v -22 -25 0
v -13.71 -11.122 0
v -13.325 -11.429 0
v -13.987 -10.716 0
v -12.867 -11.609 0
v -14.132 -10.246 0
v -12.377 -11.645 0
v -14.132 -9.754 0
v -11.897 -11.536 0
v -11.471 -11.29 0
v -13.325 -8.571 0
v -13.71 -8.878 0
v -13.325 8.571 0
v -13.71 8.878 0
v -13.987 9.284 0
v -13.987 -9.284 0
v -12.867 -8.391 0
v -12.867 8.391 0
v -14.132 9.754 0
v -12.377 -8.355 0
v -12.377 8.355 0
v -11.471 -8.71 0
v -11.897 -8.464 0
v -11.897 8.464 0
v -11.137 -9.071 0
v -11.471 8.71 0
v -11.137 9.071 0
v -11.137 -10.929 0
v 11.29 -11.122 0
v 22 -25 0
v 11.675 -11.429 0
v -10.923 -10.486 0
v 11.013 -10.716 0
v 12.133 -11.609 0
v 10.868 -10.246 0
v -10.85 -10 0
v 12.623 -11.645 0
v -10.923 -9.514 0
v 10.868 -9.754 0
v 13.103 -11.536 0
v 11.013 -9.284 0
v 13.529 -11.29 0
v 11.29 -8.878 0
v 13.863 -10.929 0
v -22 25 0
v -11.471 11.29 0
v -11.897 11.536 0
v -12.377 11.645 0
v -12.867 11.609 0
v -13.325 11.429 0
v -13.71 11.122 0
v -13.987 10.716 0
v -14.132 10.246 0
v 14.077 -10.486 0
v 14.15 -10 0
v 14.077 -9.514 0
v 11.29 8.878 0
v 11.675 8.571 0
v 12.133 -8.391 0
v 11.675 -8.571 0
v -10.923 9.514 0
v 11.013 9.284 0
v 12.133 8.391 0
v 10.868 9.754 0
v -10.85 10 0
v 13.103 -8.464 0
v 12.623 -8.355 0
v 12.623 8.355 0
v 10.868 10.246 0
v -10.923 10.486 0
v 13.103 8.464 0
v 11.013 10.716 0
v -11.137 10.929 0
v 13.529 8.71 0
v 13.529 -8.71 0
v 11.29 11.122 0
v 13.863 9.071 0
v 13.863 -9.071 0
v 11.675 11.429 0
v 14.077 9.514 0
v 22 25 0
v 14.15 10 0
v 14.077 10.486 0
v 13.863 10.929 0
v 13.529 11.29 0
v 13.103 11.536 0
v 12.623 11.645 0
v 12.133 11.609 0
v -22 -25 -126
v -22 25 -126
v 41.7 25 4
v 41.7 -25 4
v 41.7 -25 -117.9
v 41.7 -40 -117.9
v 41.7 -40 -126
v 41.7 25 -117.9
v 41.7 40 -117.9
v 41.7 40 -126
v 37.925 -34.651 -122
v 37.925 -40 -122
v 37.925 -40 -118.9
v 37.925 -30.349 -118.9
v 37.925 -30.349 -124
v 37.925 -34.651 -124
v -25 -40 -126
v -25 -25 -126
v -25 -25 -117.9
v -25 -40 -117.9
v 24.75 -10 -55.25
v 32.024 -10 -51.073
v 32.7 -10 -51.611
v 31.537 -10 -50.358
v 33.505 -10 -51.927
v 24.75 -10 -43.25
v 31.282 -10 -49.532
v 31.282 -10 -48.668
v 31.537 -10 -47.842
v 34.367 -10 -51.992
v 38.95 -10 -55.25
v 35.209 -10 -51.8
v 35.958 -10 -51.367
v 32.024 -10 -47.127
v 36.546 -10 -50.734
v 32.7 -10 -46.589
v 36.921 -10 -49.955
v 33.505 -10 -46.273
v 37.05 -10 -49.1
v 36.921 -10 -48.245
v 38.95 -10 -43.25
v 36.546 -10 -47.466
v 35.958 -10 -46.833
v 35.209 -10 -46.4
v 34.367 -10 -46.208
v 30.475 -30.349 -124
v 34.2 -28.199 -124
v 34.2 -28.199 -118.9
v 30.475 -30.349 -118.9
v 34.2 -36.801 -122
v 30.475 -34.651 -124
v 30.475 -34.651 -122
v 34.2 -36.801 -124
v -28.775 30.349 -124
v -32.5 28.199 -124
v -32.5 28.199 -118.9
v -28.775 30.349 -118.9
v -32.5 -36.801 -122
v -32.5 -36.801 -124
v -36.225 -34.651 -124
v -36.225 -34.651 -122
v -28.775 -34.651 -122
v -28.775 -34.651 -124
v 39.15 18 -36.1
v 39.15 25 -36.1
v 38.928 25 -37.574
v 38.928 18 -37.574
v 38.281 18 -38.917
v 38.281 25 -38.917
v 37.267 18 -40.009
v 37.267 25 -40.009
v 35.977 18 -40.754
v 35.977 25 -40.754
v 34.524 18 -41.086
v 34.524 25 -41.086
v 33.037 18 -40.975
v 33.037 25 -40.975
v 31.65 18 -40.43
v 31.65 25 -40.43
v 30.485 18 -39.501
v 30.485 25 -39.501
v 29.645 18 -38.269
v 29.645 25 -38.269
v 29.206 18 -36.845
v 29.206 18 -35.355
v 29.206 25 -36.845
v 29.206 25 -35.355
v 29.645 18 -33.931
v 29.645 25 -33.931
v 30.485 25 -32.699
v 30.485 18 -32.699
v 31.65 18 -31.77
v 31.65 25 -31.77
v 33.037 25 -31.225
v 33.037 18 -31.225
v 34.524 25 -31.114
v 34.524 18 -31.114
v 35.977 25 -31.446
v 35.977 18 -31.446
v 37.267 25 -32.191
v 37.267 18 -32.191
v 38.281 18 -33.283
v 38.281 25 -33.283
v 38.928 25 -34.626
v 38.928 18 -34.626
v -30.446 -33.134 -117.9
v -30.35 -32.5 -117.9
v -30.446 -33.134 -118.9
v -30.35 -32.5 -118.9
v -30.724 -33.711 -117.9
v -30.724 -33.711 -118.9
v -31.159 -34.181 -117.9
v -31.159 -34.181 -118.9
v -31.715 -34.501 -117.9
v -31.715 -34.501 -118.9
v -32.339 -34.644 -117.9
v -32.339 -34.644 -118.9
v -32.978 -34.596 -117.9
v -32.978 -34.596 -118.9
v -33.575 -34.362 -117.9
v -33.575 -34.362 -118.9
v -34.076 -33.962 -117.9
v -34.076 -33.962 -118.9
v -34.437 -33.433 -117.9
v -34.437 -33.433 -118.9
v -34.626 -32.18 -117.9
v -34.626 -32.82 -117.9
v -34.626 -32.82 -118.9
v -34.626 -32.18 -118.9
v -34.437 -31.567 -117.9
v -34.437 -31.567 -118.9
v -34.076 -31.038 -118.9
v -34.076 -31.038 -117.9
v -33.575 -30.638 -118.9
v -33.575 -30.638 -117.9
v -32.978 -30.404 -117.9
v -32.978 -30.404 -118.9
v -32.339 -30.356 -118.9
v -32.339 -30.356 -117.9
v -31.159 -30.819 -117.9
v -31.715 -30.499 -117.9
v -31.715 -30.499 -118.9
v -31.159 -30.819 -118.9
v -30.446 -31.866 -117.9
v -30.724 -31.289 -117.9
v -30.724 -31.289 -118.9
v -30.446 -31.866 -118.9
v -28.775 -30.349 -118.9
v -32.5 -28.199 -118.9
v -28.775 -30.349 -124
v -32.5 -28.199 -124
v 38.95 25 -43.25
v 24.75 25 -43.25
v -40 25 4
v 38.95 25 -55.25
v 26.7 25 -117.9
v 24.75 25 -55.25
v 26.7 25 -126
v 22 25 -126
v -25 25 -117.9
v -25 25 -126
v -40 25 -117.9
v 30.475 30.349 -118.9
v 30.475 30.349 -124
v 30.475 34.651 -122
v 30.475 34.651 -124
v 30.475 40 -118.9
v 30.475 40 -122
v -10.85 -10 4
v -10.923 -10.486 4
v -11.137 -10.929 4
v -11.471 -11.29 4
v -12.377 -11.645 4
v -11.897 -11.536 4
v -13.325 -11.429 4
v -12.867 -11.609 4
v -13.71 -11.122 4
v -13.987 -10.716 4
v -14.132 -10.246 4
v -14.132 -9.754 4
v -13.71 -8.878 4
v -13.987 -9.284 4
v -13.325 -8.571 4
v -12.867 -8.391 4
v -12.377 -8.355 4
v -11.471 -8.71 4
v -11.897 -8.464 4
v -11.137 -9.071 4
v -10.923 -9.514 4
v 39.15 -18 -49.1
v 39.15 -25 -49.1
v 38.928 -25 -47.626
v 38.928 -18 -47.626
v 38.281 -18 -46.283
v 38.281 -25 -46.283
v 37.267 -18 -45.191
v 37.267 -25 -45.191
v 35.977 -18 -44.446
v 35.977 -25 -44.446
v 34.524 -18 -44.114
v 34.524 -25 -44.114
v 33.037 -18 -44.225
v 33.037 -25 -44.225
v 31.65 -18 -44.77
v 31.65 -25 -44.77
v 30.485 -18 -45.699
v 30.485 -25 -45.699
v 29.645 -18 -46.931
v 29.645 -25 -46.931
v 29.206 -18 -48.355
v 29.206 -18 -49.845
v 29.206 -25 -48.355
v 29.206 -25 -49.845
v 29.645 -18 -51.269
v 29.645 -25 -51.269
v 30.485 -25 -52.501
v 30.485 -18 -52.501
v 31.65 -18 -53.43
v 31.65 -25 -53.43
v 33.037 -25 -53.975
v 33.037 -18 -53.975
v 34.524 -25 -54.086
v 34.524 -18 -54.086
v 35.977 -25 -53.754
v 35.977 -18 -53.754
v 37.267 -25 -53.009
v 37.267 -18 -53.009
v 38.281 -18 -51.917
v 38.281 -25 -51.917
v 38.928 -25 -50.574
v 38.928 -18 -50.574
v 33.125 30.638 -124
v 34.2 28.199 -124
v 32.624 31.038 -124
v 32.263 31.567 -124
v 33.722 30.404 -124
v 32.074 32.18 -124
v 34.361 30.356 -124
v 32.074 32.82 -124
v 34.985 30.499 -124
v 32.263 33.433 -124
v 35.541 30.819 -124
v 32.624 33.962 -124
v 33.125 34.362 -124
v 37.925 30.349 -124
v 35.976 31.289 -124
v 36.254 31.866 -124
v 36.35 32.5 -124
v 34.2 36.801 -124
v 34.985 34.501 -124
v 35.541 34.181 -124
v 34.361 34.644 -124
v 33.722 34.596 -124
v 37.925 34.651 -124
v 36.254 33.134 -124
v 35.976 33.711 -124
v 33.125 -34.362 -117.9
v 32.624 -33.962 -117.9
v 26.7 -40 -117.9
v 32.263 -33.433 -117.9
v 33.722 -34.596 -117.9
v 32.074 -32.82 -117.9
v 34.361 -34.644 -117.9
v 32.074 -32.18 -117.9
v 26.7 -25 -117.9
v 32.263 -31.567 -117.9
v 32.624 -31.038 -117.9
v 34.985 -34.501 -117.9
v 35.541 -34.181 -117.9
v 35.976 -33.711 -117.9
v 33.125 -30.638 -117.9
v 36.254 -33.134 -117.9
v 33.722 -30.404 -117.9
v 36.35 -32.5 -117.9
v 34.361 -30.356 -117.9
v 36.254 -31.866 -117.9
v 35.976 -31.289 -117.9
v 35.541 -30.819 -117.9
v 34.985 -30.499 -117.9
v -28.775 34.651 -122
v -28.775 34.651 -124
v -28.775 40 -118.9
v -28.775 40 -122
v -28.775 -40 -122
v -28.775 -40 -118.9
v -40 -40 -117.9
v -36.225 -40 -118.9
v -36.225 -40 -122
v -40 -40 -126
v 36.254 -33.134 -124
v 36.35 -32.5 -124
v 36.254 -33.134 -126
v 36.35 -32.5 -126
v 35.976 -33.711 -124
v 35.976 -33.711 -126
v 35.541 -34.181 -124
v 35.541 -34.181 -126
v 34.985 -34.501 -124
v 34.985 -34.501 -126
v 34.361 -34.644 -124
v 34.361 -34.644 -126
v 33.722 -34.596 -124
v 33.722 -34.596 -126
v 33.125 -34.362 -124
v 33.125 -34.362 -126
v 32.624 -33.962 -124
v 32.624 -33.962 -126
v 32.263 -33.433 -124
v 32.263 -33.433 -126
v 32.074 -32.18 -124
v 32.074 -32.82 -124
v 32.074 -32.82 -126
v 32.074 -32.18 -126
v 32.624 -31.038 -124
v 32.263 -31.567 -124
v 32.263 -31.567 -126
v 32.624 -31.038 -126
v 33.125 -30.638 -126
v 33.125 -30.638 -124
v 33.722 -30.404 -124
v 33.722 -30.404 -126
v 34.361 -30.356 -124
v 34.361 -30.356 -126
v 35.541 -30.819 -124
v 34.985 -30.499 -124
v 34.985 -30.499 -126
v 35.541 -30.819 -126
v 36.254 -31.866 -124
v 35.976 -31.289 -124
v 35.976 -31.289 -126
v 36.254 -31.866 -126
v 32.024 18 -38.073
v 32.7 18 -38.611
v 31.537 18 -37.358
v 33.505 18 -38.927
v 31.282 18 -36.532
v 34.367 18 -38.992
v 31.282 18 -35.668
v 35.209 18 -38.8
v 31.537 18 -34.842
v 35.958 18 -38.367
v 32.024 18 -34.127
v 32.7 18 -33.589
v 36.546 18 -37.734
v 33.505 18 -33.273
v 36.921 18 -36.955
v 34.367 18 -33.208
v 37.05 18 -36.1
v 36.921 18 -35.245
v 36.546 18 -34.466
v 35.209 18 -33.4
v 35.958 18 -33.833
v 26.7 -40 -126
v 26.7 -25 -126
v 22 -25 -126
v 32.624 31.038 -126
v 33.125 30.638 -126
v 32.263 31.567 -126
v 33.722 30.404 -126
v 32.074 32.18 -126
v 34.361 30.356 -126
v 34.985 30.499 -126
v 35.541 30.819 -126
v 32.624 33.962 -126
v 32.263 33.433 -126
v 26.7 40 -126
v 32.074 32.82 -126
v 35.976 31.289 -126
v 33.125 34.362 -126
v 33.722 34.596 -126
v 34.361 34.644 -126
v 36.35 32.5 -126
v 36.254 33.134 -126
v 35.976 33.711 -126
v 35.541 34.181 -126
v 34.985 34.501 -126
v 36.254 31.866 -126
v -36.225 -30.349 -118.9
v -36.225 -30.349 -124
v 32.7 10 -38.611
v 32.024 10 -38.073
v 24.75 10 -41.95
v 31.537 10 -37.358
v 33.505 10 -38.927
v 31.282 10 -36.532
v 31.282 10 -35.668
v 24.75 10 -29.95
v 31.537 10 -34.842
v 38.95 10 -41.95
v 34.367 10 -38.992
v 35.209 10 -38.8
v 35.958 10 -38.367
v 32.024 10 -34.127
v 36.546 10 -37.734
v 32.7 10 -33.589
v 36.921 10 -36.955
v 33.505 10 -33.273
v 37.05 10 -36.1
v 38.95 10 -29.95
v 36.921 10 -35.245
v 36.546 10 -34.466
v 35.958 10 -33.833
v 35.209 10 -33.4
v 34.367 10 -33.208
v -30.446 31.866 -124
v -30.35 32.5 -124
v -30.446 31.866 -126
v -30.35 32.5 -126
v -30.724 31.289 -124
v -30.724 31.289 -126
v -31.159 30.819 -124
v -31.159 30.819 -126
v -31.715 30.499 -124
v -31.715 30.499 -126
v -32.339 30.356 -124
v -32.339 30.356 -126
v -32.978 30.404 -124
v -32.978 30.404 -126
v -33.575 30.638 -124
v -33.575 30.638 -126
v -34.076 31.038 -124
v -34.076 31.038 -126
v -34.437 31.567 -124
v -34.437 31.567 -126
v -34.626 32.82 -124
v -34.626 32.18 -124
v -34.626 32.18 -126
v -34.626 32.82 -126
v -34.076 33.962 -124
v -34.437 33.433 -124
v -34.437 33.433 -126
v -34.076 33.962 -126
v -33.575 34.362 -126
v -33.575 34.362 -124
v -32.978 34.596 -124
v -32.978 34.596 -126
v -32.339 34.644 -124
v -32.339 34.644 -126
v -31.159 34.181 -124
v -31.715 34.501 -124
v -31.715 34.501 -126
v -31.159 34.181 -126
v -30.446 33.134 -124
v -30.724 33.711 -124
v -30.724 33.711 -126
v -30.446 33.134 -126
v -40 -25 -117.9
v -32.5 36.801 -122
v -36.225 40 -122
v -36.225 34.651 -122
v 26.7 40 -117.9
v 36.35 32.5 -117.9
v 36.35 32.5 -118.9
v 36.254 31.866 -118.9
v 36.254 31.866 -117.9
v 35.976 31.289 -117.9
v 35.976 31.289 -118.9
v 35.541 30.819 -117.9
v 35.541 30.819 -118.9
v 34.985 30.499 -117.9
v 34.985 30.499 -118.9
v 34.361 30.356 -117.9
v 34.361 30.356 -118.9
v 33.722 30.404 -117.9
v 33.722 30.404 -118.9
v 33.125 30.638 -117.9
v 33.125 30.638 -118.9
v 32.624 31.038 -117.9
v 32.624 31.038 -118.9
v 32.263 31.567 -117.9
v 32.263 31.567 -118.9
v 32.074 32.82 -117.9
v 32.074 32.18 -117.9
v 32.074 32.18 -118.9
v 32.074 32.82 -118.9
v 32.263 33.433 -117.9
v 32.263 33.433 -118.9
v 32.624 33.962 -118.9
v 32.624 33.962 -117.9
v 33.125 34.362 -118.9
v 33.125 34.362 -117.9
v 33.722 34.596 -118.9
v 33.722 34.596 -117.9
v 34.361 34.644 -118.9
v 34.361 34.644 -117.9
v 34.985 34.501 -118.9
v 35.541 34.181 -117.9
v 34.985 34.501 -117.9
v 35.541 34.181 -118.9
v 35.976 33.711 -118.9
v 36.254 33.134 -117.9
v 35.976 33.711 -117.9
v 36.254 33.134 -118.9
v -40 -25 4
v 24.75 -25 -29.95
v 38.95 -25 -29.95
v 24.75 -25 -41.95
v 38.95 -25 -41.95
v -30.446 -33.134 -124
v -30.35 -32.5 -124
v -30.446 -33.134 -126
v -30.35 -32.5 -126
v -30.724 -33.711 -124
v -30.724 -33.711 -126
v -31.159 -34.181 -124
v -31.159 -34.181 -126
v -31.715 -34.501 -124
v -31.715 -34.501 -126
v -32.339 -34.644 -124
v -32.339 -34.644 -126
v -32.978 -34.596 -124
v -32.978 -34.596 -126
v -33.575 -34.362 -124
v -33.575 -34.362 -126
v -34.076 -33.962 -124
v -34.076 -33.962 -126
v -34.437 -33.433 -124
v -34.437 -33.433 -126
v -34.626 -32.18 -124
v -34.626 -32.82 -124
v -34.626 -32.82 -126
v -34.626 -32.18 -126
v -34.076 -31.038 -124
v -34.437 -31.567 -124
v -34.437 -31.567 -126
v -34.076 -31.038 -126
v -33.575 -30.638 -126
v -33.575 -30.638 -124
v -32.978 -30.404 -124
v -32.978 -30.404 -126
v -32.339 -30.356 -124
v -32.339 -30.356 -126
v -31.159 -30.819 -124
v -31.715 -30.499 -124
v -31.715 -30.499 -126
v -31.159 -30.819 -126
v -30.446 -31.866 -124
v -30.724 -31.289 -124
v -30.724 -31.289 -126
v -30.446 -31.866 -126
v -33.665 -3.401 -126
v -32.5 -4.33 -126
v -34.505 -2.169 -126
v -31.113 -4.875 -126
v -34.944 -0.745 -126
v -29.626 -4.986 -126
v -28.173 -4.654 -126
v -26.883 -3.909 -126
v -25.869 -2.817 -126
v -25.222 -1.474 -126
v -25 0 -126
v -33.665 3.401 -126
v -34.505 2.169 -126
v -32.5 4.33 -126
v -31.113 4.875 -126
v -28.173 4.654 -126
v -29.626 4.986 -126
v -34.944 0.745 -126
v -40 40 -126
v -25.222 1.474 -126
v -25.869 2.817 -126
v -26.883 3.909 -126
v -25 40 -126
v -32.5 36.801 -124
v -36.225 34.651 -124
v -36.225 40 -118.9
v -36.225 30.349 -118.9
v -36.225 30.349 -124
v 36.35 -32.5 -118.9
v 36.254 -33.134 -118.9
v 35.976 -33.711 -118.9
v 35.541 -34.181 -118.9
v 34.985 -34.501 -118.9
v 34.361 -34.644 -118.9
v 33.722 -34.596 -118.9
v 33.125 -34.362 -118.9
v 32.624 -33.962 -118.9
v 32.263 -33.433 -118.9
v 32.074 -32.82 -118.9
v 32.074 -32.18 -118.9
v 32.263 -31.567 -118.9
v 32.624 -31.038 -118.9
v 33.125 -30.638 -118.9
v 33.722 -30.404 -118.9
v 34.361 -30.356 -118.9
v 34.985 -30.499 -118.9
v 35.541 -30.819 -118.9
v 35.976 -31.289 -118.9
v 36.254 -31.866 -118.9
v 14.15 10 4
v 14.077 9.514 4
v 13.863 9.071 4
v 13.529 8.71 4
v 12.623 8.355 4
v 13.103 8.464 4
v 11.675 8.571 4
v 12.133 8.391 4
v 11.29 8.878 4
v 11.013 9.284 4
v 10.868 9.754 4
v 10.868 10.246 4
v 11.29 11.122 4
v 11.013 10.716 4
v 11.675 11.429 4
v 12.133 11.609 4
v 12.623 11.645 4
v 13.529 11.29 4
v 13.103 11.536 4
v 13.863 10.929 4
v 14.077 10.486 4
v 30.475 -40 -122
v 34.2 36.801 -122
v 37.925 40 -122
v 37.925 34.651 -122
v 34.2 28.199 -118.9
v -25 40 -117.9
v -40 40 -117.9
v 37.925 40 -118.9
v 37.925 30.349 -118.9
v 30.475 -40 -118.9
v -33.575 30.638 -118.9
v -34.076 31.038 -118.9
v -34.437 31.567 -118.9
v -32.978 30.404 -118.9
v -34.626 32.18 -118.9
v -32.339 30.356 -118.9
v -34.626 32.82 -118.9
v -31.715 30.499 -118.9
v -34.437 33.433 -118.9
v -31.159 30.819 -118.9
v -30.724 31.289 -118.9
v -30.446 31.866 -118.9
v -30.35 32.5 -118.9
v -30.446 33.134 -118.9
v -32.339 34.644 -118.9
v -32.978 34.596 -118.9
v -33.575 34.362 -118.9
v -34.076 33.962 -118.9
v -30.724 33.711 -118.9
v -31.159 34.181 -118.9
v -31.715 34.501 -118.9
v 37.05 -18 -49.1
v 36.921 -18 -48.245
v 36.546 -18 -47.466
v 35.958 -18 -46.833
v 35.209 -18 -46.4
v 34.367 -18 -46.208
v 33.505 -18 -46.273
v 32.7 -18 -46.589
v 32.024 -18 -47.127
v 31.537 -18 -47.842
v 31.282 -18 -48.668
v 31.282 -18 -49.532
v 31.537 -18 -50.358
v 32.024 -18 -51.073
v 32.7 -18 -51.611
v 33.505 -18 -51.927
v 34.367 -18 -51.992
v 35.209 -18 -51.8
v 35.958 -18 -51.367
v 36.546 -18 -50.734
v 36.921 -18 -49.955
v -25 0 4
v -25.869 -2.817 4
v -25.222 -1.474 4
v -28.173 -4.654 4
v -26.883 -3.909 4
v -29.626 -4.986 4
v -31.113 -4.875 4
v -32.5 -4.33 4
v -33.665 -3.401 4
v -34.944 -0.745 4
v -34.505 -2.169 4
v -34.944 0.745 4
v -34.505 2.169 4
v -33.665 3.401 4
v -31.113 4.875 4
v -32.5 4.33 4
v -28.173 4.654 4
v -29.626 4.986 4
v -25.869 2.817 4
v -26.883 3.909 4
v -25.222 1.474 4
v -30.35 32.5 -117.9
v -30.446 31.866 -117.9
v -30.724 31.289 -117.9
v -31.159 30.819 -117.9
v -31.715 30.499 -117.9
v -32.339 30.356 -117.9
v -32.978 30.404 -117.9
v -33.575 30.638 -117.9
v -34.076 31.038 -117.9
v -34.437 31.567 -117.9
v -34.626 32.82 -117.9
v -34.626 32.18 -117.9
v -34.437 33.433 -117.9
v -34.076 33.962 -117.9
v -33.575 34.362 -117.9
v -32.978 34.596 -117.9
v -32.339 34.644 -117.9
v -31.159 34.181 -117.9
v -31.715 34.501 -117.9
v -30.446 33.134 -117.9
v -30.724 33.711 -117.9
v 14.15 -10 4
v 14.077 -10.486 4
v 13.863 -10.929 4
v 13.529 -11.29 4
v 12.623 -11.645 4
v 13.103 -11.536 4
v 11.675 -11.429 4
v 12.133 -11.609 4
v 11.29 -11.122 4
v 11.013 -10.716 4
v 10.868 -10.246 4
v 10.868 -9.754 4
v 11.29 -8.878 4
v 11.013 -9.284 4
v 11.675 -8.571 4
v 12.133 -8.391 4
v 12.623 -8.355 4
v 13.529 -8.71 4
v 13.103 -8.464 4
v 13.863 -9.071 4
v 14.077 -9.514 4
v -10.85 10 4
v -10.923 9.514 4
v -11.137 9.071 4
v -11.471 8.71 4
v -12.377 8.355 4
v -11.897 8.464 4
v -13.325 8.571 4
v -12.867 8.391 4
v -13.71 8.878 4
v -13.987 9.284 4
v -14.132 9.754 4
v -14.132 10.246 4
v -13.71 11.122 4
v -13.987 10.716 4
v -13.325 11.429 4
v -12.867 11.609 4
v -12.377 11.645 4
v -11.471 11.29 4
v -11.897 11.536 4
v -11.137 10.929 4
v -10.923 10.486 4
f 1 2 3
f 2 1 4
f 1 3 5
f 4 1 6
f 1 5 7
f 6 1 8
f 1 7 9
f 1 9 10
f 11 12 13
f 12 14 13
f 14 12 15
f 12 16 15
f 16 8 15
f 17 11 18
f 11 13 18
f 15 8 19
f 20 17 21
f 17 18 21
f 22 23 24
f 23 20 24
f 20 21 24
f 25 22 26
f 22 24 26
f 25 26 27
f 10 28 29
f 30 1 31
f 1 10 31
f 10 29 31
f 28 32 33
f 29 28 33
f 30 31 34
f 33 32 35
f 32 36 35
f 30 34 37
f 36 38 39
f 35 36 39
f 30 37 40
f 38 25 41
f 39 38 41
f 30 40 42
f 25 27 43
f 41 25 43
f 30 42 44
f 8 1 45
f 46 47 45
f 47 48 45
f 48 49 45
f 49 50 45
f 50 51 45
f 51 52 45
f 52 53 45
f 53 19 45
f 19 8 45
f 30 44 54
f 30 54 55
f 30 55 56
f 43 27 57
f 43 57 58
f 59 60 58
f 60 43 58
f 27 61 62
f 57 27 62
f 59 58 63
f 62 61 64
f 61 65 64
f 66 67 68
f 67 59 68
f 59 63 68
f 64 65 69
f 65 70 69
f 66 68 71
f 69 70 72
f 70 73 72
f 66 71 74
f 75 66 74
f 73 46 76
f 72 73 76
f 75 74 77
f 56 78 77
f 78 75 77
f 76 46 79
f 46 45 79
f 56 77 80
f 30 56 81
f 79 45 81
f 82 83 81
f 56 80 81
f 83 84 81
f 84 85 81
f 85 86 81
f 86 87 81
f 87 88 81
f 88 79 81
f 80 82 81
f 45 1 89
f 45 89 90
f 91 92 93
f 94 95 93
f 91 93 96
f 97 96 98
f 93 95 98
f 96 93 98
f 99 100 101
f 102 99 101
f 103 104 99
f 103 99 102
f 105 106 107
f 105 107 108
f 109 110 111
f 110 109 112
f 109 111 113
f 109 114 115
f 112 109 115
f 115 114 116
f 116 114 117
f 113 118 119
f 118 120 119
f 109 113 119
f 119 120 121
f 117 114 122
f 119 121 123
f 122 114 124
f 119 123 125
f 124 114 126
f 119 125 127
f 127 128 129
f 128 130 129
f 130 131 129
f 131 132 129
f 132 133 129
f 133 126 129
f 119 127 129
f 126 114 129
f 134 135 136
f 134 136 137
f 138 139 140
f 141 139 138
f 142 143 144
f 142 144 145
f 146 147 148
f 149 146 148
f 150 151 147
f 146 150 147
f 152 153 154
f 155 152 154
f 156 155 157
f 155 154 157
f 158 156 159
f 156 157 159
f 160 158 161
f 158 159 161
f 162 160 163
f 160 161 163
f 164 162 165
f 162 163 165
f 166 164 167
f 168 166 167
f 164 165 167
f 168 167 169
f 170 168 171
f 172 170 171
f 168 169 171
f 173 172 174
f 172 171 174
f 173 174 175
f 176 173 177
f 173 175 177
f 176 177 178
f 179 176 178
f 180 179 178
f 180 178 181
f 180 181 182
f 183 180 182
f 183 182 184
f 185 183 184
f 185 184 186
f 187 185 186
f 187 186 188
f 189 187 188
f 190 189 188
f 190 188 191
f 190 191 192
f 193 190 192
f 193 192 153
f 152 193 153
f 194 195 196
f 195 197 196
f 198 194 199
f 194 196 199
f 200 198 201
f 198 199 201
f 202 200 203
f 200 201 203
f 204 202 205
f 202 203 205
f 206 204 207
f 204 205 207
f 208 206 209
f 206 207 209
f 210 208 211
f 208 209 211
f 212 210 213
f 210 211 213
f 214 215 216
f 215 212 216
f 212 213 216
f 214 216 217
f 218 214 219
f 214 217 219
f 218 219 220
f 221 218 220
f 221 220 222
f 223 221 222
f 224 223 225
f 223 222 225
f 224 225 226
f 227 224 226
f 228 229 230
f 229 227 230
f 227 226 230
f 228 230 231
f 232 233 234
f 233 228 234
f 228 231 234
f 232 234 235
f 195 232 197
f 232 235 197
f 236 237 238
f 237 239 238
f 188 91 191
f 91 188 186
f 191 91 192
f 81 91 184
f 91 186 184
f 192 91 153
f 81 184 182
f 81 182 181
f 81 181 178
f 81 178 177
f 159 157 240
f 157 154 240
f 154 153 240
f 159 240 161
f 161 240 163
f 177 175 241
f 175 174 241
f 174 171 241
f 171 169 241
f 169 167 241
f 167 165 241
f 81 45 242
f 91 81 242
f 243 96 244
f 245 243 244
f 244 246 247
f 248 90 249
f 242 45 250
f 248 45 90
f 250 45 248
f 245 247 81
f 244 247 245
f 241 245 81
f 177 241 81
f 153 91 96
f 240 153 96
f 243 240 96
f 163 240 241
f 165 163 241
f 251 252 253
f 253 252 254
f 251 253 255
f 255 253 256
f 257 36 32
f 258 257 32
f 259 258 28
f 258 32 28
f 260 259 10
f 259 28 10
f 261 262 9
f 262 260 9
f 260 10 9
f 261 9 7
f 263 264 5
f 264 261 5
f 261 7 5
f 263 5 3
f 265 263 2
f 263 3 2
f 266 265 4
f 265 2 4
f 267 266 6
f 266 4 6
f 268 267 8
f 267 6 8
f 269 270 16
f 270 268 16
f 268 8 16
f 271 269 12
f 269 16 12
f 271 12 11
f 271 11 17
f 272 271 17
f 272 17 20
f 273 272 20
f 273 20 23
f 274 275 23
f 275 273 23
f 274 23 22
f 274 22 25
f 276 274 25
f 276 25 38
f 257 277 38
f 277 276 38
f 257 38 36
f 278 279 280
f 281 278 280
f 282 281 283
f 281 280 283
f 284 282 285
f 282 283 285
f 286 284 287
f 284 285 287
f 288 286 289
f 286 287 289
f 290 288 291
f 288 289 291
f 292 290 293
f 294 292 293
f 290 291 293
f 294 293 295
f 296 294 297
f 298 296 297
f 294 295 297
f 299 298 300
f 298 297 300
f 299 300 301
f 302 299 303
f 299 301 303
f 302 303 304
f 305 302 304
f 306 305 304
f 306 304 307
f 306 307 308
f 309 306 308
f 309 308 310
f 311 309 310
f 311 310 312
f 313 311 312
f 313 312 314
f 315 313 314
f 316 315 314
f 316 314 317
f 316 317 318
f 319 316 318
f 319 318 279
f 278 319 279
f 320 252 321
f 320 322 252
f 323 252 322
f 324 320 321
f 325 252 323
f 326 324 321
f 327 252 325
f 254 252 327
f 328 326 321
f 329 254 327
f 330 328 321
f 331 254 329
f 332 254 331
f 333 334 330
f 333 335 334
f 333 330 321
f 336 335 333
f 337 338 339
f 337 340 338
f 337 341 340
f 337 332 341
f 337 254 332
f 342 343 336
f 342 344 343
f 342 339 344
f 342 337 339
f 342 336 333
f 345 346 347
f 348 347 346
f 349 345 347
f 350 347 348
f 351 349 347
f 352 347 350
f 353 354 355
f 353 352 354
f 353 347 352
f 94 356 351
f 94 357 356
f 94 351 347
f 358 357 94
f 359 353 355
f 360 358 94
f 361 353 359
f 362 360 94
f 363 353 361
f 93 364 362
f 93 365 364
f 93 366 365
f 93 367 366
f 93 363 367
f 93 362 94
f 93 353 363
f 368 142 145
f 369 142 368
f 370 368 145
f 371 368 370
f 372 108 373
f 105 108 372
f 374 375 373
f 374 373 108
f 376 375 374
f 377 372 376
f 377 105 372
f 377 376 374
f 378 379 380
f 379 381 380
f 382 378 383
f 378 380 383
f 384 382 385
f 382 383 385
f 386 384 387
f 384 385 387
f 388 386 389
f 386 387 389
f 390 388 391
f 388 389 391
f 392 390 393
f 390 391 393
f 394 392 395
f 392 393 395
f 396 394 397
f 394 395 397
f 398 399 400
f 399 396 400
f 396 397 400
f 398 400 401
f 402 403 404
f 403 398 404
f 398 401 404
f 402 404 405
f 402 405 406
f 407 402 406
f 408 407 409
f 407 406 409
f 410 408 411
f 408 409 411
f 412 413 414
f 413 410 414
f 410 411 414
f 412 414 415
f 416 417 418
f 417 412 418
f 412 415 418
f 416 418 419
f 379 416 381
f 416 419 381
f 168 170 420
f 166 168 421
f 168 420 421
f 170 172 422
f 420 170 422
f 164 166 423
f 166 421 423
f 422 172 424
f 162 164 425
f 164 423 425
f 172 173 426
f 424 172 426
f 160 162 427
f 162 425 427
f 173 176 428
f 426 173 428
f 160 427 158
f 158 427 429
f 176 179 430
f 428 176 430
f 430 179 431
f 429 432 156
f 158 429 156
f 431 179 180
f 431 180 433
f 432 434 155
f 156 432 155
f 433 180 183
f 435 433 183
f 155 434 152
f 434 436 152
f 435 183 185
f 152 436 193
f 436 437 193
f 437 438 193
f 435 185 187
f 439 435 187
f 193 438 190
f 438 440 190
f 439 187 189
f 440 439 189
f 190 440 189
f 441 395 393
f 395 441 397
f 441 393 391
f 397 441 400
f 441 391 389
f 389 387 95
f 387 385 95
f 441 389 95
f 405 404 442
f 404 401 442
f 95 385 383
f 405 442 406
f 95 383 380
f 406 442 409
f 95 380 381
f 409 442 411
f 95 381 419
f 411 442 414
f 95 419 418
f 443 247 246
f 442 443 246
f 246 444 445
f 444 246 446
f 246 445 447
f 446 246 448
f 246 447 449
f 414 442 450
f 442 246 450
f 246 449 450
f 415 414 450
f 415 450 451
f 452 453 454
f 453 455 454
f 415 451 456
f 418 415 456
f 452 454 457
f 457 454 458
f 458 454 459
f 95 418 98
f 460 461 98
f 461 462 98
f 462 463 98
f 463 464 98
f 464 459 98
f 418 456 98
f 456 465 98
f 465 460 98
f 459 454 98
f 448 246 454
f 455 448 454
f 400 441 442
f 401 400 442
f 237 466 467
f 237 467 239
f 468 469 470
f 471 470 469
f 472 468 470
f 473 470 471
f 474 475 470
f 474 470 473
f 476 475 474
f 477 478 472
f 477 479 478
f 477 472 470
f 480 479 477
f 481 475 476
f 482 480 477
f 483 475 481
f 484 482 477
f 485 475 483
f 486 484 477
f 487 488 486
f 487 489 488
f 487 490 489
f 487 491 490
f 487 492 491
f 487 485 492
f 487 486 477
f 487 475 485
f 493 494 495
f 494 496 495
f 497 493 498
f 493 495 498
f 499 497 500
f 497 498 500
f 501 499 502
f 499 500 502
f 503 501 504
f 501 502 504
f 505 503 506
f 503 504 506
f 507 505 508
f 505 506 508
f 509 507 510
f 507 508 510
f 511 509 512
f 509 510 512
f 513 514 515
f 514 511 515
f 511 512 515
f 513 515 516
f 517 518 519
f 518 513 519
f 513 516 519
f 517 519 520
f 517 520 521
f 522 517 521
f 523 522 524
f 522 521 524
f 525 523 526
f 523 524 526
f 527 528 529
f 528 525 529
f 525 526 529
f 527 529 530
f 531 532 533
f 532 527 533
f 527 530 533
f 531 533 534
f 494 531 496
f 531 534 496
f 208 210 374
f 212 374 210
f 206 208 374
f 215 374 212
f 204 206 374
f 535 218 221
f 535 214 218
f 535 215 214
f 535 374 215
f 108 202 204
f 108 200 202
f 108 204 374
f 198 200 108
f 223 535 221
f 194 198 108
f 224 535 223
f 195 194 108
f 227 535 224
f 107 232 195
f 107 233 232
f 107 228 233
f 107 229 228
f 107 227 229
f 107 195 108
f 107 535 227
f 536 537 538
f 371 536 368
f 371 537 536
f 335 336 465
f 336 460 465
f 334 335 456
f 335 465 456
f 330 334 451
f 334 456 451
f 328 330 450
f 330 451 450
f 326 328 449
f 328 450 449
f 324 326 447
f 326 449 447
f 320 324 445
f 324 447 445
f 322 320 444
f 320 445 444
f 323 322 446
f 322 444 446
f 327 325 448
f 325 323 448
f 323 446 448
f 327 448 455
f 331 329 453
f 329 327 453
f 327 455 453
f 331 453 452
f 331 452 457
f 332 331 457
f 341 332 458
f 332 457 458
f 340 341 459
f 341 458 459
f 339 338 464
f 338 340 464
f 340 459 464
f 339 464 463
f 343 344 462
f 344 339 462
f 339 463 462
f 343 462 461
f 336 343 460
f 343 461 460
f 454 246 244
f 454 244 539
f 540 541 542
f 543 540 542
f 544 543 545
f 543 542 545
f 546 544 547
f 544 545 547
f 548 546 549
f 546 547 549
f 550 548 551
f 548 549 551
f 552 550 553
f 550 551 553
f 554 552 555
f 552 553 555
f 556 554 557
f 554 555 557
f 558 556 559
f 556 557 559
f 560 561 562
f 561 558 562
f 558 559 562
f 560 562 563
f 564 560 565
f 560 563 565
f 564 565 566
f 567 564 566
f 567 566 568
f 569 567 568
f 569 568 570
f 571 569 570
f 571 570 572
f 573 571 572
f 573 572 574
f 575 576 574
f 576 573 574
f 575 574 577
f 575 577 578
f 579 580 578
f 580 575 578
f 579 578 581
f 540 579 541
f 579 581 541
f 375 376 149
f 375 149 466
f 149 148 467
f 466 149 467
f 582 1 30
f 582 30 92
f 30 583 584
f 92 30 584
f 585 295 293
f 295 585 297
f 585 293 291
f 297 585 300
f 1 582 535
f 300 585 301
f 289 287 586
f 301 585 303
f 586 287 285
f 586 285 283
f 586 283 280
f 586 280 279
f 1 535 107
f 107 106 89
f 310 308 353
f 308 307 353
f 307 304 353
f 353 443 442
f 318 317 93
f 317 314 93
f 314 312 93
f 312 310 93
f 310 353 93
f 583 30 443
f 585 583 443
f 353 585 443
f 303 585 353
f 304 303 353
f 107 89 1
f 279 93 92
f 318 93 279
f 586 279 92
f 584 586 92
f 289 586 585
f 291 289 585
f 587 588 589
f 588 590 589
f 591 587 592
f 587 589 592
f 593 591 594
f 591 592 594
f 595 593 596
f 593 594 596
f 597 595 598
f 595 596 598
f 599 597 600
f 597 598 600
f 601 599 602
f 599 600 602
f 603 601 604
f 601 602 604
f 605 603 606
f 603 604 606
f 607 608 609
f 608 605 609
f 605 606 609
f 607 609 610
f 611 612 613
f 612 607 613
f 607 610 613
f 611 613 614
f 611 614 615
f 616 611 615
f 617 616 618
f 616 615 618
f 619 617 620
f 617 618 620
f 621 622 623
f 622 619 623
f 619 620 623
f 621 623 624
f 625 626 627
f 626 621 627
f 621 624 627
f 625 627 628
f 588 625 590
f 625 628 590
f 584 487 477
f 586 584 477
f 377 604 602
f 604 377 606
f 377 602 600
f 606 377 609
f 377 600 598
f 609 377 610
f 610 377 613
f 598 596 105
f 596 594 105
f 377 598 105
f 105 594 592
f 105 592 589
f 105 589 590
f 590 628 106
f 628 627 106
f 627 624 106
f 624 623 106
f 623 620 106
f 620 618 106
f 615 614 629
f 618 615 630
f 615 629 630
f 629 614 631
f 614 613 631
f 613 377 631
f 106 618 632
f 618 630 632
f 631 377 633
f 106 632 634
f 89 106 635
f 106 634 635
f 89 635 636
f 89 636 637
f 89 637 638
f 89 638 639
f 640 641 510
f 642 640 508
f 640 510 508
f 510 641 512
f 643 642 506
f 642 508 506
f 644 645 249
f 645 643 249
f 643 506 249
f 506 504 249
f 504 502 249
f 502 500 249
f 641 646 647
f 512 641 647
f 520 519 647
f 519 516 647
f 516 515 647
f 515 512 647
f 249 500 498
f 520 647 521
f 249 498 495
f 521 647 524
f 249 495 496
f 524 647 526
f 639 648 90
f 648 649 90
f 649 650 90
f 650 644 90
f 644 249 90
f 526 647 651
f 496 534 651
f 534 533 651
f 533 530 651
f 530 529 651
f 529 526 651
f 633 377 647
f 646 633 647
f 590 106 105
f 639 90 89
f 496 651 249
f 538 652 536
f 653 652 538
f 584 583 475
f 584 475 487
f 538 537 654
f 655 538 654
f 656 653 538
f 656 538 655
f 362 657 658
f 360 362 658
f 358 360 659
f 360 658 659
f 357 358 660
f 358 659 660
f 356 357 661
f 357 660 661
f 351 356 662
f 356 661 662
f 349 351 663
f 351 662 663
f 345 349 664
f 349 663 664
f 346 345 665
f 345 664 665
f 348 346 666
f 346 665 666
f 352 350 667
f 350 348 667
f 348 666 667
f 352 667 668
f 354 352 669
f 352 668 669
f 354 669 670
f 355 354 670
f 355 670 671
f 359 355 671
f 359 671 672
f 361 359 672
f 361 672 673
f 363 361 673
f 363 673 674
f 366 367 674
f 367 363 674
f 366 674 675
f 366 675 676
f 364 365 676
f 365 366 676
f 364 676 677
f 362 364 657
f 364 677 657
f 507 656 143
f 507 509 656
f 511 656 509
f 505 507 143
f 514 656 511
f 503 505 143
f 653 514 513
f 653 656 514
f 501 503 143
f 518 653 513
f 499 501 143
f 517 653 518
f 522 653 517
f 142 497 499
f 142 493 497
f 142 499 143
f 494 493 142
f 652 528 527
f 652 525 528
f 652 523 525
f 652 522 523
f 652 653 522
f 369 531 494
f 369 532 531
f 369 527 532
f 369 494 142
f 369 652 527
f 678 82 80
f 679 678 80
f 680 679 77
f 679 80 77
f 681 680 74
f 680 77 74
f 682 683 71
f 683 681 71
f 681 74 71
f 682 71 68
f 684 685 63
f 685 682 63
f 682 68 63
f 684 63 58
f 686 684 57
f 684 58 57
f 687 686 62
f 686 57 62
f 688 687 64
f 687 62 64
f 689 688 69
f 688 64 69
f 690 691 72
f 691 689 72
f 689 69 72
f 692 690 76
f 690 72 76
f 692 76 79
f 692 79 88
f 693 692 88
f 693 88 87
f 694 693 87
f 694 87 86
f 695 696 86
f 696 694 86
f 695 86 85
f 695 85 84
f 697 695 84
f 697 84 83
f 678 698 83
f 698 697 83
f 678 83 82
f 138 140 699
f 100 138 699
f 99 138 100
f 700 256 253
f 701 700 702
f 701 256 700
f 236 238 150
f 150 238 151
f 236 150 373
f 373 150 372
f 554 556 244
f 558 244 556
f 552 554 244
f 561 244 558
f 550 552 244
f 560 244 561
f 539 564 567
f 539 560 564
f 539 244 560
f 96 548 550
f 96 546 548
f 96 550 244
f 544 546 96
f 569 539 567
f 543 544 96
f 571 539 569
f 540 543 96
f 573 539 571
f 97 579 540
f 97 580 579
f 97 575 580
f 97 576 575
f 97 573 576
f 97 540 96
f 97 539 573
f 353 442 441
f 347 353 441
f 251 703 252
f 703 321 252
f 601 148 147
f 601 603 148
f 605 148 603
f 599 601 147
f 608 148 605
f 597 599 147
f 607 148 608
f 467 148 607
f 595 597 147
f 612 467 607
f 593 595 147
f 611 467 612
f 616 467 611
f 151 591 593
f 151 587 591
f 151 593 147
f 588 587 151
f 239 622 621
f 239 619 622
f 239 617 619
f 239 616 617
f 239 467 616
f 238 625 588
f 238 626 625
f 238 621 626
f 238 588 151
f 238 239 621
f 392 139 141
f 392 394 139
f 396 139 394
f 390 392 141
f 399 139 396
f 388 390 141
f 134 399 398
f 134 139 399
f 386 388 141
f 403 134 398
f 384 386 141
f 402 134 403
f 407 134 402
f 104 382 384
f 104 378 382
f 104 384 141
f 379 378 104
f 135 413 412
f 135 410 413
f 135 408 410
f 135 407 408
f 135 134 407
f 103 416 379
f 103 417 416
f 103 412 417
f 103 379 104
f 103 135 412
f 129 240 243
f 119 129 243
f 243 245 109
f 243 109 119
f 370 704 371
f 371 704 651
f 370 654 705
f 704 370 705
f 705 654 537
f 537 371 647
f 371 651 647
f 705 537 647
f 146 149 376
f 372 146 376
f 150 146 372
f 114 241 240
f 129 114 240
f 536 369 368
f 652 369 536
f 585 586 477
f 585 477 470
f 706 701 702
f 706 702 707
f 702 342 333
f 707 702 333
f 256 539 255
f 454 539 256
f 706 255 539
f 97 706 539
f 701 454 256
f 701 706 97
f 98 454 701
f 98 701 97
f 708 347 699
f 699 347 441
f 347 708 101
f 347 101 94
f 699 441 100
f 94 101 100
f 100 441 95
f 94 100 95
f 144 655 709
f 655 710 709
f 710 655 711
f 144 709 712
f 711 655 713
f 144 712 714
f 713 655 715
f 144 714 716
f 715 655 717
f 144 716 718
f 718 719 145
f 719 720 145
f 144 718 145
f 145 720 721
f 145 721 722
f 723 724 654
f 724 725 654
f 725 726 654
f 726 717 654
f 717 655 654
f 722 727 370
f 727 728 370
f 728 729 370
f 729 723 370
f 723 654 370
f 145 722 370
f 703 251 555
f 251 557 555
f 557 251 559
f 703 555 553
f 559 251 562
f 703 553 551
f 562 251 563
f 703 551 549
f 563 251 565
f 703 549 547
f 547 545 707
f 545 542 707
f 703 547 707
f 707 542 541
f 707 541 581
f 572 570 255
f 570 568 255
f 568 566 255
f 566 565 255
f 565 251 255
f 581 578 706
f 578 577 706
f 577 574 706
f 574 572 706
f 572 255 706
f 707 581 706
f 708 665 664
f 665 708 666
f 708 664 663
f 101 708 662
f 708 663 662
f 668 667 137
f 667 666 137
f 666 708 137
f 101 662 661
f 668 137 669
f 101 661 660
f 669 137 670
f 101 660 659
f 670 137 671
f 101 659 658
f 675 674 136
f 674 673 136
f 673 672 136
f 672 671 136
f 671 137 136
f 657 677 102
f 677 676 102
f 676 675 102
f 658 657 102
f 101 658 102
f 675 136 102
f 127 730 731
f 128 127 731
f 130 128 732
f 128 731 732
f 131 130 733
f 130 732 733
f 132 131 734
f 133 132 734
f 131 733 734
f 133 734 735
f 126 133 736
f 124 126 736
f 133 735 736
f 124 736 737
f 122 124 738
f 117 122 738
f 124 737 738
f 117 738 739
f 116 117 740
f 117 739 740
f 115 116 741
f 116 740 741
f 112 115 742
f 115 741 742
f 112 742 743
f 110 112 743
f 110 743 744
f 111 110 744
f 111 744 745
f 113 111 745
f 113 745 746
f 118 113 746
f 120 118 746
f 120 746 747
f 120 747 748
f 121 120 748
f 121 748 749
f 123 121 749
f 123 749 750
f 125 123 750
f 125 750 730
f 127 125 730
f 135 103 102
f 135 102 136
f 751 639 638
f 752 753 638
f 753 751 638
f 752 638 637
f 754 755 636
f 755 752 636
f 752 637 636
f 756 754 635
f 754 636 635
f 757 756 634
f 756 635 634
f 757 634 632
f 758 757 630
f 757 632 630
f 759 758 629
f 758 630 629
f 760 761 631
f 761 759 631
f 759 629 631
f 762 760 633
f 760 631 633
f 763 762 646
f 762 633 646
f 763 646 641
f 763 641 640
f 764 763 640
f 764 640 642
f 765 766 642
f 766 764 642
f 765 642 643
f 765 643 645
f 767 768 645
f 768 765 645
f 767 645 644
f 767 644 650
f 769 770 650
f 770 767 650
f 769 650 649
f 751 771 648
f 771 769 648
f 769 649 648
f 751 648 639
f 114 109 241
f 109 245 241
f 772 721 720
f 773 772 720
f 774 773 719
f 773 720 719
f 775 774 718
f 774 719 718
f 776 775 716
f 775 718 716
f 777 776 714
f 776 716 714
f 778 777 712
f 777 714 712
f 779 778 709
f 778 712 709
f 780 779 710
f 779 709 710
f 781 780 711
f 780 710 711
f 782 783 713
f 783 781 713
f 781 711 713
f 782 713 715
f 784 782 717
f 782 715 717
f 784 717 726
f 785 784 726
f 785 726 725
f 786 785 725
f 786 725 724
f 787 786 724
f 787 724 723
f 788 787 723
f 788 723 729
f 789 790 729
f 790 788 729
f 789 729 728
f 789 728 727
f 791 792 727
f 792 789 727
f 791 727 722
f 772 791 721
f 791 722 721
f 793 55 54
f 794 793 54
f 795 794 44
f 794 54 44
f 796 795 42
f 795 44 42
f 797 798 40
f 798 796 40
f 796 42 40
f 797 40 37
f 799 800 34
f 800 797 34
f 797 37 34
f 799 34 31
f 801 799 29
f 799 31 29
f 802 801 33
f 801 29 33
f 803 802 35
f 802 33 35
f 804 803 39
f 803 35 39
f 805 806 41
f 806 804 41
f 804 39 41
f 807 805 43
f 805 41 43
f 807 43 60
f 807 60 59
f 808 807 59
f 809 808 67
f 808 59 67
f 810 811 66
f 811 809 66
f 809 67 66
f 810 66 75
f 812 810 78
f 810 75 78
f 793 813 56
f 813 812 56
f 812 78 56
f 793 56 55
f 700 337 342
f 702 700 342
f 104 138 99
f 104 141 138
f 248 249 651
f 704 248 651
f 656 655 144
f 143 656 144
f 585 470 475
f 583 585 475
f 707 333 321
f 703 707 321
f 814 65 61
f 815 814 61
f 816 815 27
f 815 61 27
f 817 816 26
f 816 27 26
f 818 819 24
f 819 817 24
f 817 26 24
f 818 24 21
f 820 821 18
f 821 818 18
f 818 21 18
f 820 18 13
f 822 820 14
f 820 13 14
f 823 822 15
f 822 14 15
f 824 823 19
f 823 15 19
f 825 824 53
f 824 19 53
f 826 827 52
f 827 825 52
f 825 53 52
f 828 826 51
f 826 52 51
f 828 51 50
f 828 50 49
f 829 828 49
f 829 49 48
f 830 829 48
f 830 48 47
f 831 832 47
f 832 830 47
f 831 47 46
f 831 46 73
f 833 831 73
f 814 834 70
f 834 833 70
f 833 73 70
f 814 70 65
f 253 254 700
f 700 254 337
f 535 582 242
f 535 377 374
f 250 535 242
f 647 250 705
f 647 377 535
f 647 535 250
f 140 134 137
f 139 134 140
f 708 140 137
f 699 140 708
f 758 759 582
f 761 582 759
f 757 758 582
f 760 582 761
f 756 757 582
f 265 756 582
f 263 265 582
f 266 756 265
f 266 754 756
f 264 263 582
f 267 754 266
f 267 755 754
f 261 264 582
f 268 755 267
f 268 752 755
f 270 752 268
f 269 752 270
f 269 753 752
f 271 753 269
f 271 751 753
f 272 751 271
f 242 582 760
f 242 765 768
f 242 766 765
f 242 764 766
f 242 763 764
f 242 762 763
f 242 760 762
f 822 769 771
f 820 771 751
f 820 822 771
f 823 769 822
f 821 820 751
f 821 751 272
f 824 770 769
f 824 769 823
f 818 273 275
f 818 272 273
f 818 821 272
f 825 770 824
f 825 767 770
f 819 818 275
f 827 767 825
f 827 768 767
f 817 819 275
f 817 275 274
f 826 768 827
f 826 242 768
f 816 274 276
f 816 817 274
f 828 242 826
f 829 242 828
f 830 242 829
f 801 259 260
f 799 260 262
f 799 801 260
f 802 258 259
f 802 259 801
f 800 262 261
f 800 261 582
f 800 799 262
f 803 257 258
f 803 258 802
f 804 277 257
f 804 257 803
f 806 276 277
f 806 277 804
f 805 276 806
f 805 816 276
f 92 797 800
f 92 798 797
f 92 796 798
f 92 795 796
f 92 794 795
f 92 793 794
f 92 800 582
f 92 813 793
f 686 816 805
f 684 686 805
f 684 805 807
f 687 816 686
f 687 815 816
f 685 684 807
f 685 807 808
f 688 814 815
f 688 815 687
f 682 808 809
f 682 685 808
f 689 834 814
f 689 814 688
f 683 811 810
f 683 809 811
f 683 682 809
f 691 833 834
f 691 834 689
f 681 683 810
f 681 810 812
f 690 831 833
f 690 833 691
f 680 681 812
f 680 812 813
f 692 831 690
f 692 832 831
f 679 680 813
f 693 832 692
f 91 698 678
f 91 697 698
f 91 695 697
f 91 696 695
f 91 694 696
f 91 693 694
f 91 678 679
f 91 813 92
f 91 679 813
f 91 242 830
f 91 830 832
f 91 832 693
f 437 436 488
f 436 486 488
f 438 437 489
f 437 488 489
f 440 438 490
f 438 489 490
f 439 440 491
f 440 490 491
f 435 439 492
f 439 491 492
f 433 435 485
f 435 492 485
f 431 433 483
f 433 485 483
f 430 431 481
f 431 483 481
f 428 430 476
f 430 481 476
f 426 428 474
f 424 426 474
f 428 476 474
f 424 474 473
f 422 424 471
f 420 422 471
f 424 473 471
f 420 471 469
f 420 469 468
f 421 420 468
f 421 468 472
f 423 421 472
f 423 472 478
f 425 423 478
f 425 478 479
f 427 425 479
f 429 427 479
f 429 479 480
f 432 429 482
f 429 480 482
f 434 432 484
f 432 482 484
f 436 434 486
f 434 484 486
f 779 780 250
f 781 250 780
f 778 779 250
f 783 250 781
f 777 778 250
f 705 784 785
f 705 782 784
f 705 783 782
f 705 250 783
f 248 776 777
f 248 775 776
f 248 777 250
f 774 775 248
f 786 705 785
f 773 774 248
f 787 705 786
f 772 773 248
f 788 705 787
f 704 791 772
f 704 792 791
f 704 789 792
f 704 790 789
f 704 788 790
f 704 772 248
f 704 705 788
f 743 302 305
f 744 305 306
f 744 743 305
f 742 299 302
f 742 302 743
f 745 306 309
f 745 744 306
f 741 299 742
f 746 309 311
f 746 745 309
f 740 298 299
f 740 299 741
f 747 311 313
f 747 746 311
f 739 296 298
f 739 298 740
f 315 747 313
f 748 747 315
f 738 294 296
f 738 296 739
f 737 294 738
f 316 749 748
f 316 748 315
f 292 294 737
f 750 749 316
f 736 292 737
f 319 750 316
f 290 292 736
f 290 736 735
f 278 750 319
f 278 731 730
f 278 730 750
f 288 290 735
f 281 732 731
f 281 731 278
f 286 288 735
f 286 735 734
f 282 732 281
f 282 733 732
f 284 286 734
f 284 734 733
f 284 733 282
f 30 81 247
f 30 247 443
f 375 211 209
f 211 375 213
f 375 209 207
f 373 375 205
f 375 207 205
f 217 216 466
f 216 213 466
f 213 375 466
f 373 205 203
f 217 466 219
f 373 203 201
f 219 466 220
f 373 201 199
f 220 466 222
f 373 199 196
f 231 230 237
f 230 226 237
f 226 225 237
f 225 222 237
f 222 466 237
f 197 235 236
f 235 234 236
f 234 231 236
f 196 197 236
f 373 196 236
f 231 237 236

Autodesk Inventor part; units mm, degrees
sketch "S-ProbeHead-BaseSkizze" plane through (0, 0, 0) normal (0, 0, 1) x (1, 0, 0)
  line L0 (-40, 40) -> (40, 40)
  line L1 (40, 40) -> (40, -40)
  line L2 (40, -40) -> (-40, -40)
  line L3 (-40, -40) -> (-40, 40)
  line L4 (-40, 40) -> (40, -40) construction
  line L5 (40, 40) -> (-40, -40) construction
  line L6 (-56.34, 0) -> (58.04, 0) construction
  circle A0 centre (-30, 0) radius 5
  line L7 (0, 83.0683) -> (0, -88.0384) construction
  line L8 (-7.5, 58.6245) -> (-7.5, -60.8735) construction
  line L9 (-16, 21) -> (16, 21) construction
  line L10 (16, 21) -> (16, -21) construction
  line L11 (16, -21) -> (-16, -21) construction
  line L12 (-16, -21) -> (-16, 21) construction
  line L13 (-16, 21) -> (16, -21) construction
  line L14 (16, 21) -> (-16, -21) construction
  circle A1 centre (-12.5, -10) radius 1.65
  circle A2 centre (-12.5, 10) radius 1.65
  circle A3 centre (12.5, -10) radius 1.65
  circle A4 centre (12.5, 10) radius 1.65
  line L15 (-20, 57.6709) -> (-20, -63.5946)
  line L16 (7.5, 58.6245) -> (7.5, -60.8735) construction
  line L17 (20, 57.6709) -> (20, -63.5946)
  line L18 (41.7, 25) -> (-40, 25)
  line L19 (-40, 25) -> (-40, -25)
  line L20 (-40, -25) -> (41.7, -25)
  line L21 (41.7, -25) -> (41.7, 25)
  line L22 (22, 25) -> (22, -25)
  line L23 (-22, -25) -> (-22, 25)
  point P0 (0, 0)
  point P1 (41.7, 0)
  dimension "d1" = 80
  dimension "d2" = 80
  dimension "d4" = 10
  dimension "d6" = 30
  dimension "d20" = 7.5
  dimension "d21" = 32
  dimension "d22" = 42
  dimension "d23" = 3.3
  dimension "d24" = 10
  dimension "d25" = 12.5
  dimension "d26" = 20
  dimension "d27" = 50
  dimension "d30" = 20
  dimension "d31" = 21.7
  dimension "d32" = 2
  dimension "d37" = 2
extrude "BasePlate" add sketch "S-ProbeHead-BaseSkizze" along normal blind 4 contours L18 L23 L20 L3 | L18 L17 L20 L15 | L15 L20 L23 L18 | L18 L22 L20 L17 | L18 L21 L20 L1 | L1 L20 L22 L18
ref_plane "Endfläche-ProbeHeadarme" through (0, 0, -126) normal (0, 0, 1) x (1, 0, 0)
ref_plane "ProfilDownside" through (0, 0, -56) normal (0, 0, 1) x (1, 0, 0)
extrude "Arms" add sketch "S-ProbeHead-BaseSkizze" against normal up to surface (126 mm away) contours L18 L23 L20 L3 | L18 L21 L20 L1 | L1 L20 L22 L18
ref_plane "Z-UpperBelt" through (0, 0, -36.1) normal (0, 0, 1) x (1, 0, 0)
ref_plane "Z-LowerBelt" through (0, 0, -49.1) normal (0, 0, 1) x (1, 0, 0)
ref_plane "X-Belts" through (26.75, 0, 0) normal (1, 0, 0) x (0, 1, 0)
sketch "S-Tensioners" plane through (-40, -25, 4) normal (0, -1, 0) x (1, 0, 0)
  line L0 (64.75, -47.25) -> (78.95, -47.25)
  line L1 (78.95, -47.25) -> (78.95, -58.95)
  line L2 (78.95, -58.95) -> (64.75, -58.95)
  line L3 (64.75, -58.95) -> (64.75, -47.25)
  line L4 (64.75, -47.25) -> (78.95, -58.95) construction
  line L5 (78.95, -47.25) -> (64.75, -58.95) construction
  line L6 (71.85, -74) -> (71.85, 12.5724) construction
  line L7 (-16.34, -40.1) -> (98.04, -40.1) construction
  line L8 (-16.34, -53.1) -> (98.04, -53.1) construction
  circle A0 centre (74.15, -53.1) radius 2.9
  line L9 (64.75, -34.25) -> (78.95, -34.25)
  line L10 (78.95, -34.25) -> (78.95, -45.95)
  line L11 (78.95, -45.95) -> (64.75, -45.95)
  line L12 (64.75, -45.95) -> (64.75, -34.25)
  line L13 (64.75, -34.25) -> (78.95, -45.95) construction
  line L14 (78.95, -34.25) -> (64.75, -45.95) construction
  circle A1 centre (74.15, -40.1) radius 2.9
  circle A2 centre (74.15, -40.1) radius 5
  circle A3 centre (74.15, -53.1) radius 5
  line L15 (66.75, 41.0869) -> (66.75, -158.5145) construction
  line L16 (78.95, -34.25) -> (64.75, -34.25)
  line L17 (64.75, -34.25) -> (64.75, -33.95)
  line L18 (64.75, -33.95) -> (78.95, -33.95)
  line L19 (78.95, -33.95) -> (78.95, -34.25)
  line L20 (78.95, -58.95) -> (64.75, -58.95)
  line L21 (64.75, -58.95) -> (64.75, -59.25)
  line L22 (64.75, -59.25) -> (78.95, -59.25)
  line L23 (78.95, -59.25) -> (78.95, -58.95)
  point P0 (40, -4)
  point P1 (78.95, -40.1)
  point P2 (78.95, -53.1)
  dimension "d38" = 14.2
  dimension "d39" = 11.7
  dimension "d42" = 5.8
  dimension "d43" = 14.2
  dimension "d44" = 11.7
  dimension "d45" = 5.8
  dimension "d53" = 4.8
  dimension "d54" = 4.8
  dimension "d55" = 10
  dimension "d56" = 10
  dimension "d58" = 7.4
  dimension "d59" = 7.4
  dimension "d79" = 0.3
  dimension "d80" = 0.3
extrude "Ex-Tensioners1-Holes" cut sketch "S-Tensioners" against normal blind 50 contours A0 | A1
extrude "Ex-Tensioners2-SlideVolume" cut sketch "S-Tensioners" along normal blind 35 from surface at -50 contours L0 L1 A3 L2 L3 | L2 L23 L22 L21 | L1 A3 picked at (78.3167, -53.1)
extrude "Ex-Tensioners3-SlideVolume" cut sketch "S-Tensioners" against normal blind 35 contours L17 L18 L19 L9 | L9 L10 A2 L11 L12 | L10 A2 picked at (78.3167, -40.1)
extrude "Ex-Tensioners4-SrewHead" cut sketch "S-Tensioners" against normal blind 7 contours A3 L1 | L1 A3
extrude "Ex-Tensioners5-SrewHead" cut sketch "S-Tensioners" along normal blind 7 from surface at -50 contours A2 L10 | L10 A2
sketch "S-Anschraubpunkte-ProbeAntenna" plane through (0, 0, -126) normal (0, 0, 1) x (1, 0, 0)
  line L0 (-56.34, 0) -> (58.04, 0) construction
  line L1 (0, 74.3335) -> (0, -68.3114) construction
  line L2 (41.7, 25) -> (-40, 25) projected
  line L3 (41.7, -25) -> (41.7, 25) projected
  line L4 (-40, -25) -> (41.7, -25) projected
  line L5 (-40, 25) -> (-40, -25) projected
  line L6 (41.7, 25) -> (26.7, 25)
  line L7 (26.7, 25) -> (26.7, 40)
  line L8 (26.7, 40) -> (41.7, 40)
  line L9 (41.7, 40) -> (41.7, 25)
  line L10 (22, -25) -> (22, 25) projected
  line L11 (22, 25) -> (22, -25) projected
  line L12 (-22, 25) -> (-22, -25) projected
  line L13 (-22, -25) -> (-22, 25) projected
  line L14 (41.7, 32.5) -> (26.7, 32.5) construction
  line L15 (34.2, 40) -> (34.2, 25) construction
  circle A0 centre (34.2, 32.5) radius 2.15
  circle A1 centre (34.2, 32.5) radius 4 construction
  line L16 (0.85, 53.9557) -> (0.85, -47.9335) construction
  line L17 (-40, 25) -> (-25, 25)
  line L18 (-25, 25) -> (-25, 40)
  line L19 (-25, 40) -> (-40, 40)
  line L20 (-40, 40) -> (-40, 25)
  circle A2 centre (-32.5, 32.5) radius 2.15
  circle A3 centre (-32.5, 32.5) radius 4 construction
  line L21 (41.7, -25) -> (26.7, -25)
  line L22 (26.7, -25) -> (26.7, -40)
  line L23 (26.7, -40) -> (41.7, -40)
  line L24 (41.7, -40) -> (41.7, -25)
  circle A4 centre (34.2, -32.5) radius 2.15
  circle A5 centre (34.2, -32.5) radius 4 construction
  line L25 (-40, -40) -> (-40, -25)
  line L26 (-25, -40) -> (-40, -40)
  line L27 (-40, -25) -> (-25, -25)
  line L28 (-25, -25) -> (-25, -40)
  circle A6 centre (-32.5, -32.5) radius 4 construction
  circle A7 centre (-32.5, -32.5) radius 2.15
  line L29 (34.2, 28.1987) -> (30.475, 30.3494)
  line L30 (30.475, 30.3494) -> (30.475, 40)
  line L31 (30.475, 34.6506) -> (34.2, 36.8013)
  line L32 (34.2, 36.8013) -> (37.925, 34.6506)
  line L33 (37.925, 40) -> (37.925, 30.3494)
  line L34 (37.925, 30.3494) -> (34.2, 28.1987)
  line L35 (34.2, -28.1987) -> (30.475, -30.3494)
  line L36 (30.475, -30.3494) -> (30.475, -40)
  line L37 (30.475, -34.6506) -> (34.2, -36.8013)
  line L38 (34.2, -36.8013) -> (37.925, -34.6506)
  line L39 (37.925, -40) -> (37.925, -30.3494)
  line L40 (37.925, -30.3494) -> (34.2, -28.1987)
  line L41 (-32.5, 28.1987) -> (-28.775, 30.3494)
  line L42 (-28.775, 30.3494) -> (-28.775, 40)
  line L43 (-28.775, 34.6506) -> (-32.5, 36.8013)
  line L44 (-32.5, 36.8013) -> (-36.225, 34.6506)
  line L45 (-36.225, 40) -> (-36.225, 30.3494)
  line L46 (-36.225, 30.3494) -> (-32.5, 28.1987)
  line L47 (-36.225, -40) -> (-36.225, -30.3494)
  line L48 (-32.5, -36.8013) -> (-36.225, -34.6506)
  line L49 (-28.775, -34.6506) -> (-32.5, -36.8013)
  line L50 (-28.775, -30.3494) -> (-28.775, -40)
  line L51 (-32.5, -28.1987) -> (-28.775, -30.3494)
  line L52 (-36.225, -30.3494) -> (-32.5, -28.1987)
  point P0 (0, 0)
  dimension "d46" = 50
  dimension "d67" = 15
  dimension "d68" = 15
  dimension "d69" = 4.3
  dimension "d70" = 8
  dimension "d71" = 81.7
  dimension "d72" = 40.85
  dimension "d75" = 65
  dimension "d76" = 66.7
  dimension "d81" = 7.45
extrude "Ex-Anschraubpunkte-Eb1" add sketch "S-Anschraubpunkte-ProbeAntenna" along normal blind 2 contours L2 L7 L8 L30 L29 L34 L33 L9 | L24 L23 L39 L40 L35 L36 L22 L4 | L33 L32 L31 L30 L8 | L23 L36 L37 L38 L39 | L33 L34 L29 L30 L31 L32 | L2 L20 L19 L45 L46 L41 L42 L18 | L38 L37 L36 L35 L40 L39 | L28 L26 L50 L51 L52 L47 L25 L4 | L42 L43 L44 L45 L19 | L42 L41 L46 L45 L44 L43 | L26 L47 L48 L49 L50 | L49 L48 L47 L52 L51 L50
extrude "Ex-Anschraubpunkte-Eb2" add sketch "S-Anschraubpunkte-ProbeAntenna" along normal blind 2 from surface at 2 contours L2 L7 L8 L30 L29 L34 L33 L9 | L24 L23 L39 L40 L35 L36 L22 L4 | L33 L32 L31 L30 L8 | L23 L36 L37 L38 L39 | L2 L20 L19 L45 L46 L41 L42 L18 | L28 L26 L50 L51 L52 L47 L25 L4 | L42 L43 L44 L45 L19 | L26 L47 L48 L49 L50
extrude "Ex-Anschraubpunkte-Eb3" add sketch "S-Anschraubpunkte-ProbeAntenna" along normal blind 3.1 from surface at 4 contours L2 L7 L8 L30 L29 L34 L33 L9 | L24 L23 L39 L40 L35 L36 L22 L4 | L2 L20 L19 L45 L46 L41 L42 L18 | L28 L26 L50 L51 L52 L47 L25 L4
extrude "Ex-Anschraubpunkte-Eb4" add sketch "S-Anschraubpunkte-ProbeAntenna" along normal blind 1 from surface at 7.1 contours L2 L7 L8 L30 L29 L34 L33 L9 | L24 L23 L39 L40 L35 L36 L22 L4 | L33 L32 L31 L30 L8 | L23 L36 L37 L38 L39 | L33 L34 L29 L30 L31 L32 | L2 L20 L19 L45 L46 L41 L42 L18 | L38 L37 L36 L35 L40 L39 | L28 L26 L50 L51 L52 L47 L25 L4 | L42 L43 L44 L45 L19 | L42 L41 L46 L45 L44 L43 | L26 L47 L48 L49 L50 | L49 L48 L47 L52 L51 L50
ref_plane "Anschraubpunkt-Spiegelebene" through (0.85, 53.9557, -126) normal (-1, 0, 0) x (0, -1, 0)
ref_plane "ProfilTopSide" through (0, 0, -16) normal (0, 0, 1) x (1, 0, 0)
equation "\"d43\" = d38"
equation "\"d44\" = d39"
equation "\"d45\" = d42"
equation "\"d53\" = d54"
equation "\"d55\" = d56"
equation "\"d58\" = d59"
equation "\"d80\" = d79"
equation "\"d72\" = 0.5 * d71"
properties part number "ProbeHead-BaseBody V2"
